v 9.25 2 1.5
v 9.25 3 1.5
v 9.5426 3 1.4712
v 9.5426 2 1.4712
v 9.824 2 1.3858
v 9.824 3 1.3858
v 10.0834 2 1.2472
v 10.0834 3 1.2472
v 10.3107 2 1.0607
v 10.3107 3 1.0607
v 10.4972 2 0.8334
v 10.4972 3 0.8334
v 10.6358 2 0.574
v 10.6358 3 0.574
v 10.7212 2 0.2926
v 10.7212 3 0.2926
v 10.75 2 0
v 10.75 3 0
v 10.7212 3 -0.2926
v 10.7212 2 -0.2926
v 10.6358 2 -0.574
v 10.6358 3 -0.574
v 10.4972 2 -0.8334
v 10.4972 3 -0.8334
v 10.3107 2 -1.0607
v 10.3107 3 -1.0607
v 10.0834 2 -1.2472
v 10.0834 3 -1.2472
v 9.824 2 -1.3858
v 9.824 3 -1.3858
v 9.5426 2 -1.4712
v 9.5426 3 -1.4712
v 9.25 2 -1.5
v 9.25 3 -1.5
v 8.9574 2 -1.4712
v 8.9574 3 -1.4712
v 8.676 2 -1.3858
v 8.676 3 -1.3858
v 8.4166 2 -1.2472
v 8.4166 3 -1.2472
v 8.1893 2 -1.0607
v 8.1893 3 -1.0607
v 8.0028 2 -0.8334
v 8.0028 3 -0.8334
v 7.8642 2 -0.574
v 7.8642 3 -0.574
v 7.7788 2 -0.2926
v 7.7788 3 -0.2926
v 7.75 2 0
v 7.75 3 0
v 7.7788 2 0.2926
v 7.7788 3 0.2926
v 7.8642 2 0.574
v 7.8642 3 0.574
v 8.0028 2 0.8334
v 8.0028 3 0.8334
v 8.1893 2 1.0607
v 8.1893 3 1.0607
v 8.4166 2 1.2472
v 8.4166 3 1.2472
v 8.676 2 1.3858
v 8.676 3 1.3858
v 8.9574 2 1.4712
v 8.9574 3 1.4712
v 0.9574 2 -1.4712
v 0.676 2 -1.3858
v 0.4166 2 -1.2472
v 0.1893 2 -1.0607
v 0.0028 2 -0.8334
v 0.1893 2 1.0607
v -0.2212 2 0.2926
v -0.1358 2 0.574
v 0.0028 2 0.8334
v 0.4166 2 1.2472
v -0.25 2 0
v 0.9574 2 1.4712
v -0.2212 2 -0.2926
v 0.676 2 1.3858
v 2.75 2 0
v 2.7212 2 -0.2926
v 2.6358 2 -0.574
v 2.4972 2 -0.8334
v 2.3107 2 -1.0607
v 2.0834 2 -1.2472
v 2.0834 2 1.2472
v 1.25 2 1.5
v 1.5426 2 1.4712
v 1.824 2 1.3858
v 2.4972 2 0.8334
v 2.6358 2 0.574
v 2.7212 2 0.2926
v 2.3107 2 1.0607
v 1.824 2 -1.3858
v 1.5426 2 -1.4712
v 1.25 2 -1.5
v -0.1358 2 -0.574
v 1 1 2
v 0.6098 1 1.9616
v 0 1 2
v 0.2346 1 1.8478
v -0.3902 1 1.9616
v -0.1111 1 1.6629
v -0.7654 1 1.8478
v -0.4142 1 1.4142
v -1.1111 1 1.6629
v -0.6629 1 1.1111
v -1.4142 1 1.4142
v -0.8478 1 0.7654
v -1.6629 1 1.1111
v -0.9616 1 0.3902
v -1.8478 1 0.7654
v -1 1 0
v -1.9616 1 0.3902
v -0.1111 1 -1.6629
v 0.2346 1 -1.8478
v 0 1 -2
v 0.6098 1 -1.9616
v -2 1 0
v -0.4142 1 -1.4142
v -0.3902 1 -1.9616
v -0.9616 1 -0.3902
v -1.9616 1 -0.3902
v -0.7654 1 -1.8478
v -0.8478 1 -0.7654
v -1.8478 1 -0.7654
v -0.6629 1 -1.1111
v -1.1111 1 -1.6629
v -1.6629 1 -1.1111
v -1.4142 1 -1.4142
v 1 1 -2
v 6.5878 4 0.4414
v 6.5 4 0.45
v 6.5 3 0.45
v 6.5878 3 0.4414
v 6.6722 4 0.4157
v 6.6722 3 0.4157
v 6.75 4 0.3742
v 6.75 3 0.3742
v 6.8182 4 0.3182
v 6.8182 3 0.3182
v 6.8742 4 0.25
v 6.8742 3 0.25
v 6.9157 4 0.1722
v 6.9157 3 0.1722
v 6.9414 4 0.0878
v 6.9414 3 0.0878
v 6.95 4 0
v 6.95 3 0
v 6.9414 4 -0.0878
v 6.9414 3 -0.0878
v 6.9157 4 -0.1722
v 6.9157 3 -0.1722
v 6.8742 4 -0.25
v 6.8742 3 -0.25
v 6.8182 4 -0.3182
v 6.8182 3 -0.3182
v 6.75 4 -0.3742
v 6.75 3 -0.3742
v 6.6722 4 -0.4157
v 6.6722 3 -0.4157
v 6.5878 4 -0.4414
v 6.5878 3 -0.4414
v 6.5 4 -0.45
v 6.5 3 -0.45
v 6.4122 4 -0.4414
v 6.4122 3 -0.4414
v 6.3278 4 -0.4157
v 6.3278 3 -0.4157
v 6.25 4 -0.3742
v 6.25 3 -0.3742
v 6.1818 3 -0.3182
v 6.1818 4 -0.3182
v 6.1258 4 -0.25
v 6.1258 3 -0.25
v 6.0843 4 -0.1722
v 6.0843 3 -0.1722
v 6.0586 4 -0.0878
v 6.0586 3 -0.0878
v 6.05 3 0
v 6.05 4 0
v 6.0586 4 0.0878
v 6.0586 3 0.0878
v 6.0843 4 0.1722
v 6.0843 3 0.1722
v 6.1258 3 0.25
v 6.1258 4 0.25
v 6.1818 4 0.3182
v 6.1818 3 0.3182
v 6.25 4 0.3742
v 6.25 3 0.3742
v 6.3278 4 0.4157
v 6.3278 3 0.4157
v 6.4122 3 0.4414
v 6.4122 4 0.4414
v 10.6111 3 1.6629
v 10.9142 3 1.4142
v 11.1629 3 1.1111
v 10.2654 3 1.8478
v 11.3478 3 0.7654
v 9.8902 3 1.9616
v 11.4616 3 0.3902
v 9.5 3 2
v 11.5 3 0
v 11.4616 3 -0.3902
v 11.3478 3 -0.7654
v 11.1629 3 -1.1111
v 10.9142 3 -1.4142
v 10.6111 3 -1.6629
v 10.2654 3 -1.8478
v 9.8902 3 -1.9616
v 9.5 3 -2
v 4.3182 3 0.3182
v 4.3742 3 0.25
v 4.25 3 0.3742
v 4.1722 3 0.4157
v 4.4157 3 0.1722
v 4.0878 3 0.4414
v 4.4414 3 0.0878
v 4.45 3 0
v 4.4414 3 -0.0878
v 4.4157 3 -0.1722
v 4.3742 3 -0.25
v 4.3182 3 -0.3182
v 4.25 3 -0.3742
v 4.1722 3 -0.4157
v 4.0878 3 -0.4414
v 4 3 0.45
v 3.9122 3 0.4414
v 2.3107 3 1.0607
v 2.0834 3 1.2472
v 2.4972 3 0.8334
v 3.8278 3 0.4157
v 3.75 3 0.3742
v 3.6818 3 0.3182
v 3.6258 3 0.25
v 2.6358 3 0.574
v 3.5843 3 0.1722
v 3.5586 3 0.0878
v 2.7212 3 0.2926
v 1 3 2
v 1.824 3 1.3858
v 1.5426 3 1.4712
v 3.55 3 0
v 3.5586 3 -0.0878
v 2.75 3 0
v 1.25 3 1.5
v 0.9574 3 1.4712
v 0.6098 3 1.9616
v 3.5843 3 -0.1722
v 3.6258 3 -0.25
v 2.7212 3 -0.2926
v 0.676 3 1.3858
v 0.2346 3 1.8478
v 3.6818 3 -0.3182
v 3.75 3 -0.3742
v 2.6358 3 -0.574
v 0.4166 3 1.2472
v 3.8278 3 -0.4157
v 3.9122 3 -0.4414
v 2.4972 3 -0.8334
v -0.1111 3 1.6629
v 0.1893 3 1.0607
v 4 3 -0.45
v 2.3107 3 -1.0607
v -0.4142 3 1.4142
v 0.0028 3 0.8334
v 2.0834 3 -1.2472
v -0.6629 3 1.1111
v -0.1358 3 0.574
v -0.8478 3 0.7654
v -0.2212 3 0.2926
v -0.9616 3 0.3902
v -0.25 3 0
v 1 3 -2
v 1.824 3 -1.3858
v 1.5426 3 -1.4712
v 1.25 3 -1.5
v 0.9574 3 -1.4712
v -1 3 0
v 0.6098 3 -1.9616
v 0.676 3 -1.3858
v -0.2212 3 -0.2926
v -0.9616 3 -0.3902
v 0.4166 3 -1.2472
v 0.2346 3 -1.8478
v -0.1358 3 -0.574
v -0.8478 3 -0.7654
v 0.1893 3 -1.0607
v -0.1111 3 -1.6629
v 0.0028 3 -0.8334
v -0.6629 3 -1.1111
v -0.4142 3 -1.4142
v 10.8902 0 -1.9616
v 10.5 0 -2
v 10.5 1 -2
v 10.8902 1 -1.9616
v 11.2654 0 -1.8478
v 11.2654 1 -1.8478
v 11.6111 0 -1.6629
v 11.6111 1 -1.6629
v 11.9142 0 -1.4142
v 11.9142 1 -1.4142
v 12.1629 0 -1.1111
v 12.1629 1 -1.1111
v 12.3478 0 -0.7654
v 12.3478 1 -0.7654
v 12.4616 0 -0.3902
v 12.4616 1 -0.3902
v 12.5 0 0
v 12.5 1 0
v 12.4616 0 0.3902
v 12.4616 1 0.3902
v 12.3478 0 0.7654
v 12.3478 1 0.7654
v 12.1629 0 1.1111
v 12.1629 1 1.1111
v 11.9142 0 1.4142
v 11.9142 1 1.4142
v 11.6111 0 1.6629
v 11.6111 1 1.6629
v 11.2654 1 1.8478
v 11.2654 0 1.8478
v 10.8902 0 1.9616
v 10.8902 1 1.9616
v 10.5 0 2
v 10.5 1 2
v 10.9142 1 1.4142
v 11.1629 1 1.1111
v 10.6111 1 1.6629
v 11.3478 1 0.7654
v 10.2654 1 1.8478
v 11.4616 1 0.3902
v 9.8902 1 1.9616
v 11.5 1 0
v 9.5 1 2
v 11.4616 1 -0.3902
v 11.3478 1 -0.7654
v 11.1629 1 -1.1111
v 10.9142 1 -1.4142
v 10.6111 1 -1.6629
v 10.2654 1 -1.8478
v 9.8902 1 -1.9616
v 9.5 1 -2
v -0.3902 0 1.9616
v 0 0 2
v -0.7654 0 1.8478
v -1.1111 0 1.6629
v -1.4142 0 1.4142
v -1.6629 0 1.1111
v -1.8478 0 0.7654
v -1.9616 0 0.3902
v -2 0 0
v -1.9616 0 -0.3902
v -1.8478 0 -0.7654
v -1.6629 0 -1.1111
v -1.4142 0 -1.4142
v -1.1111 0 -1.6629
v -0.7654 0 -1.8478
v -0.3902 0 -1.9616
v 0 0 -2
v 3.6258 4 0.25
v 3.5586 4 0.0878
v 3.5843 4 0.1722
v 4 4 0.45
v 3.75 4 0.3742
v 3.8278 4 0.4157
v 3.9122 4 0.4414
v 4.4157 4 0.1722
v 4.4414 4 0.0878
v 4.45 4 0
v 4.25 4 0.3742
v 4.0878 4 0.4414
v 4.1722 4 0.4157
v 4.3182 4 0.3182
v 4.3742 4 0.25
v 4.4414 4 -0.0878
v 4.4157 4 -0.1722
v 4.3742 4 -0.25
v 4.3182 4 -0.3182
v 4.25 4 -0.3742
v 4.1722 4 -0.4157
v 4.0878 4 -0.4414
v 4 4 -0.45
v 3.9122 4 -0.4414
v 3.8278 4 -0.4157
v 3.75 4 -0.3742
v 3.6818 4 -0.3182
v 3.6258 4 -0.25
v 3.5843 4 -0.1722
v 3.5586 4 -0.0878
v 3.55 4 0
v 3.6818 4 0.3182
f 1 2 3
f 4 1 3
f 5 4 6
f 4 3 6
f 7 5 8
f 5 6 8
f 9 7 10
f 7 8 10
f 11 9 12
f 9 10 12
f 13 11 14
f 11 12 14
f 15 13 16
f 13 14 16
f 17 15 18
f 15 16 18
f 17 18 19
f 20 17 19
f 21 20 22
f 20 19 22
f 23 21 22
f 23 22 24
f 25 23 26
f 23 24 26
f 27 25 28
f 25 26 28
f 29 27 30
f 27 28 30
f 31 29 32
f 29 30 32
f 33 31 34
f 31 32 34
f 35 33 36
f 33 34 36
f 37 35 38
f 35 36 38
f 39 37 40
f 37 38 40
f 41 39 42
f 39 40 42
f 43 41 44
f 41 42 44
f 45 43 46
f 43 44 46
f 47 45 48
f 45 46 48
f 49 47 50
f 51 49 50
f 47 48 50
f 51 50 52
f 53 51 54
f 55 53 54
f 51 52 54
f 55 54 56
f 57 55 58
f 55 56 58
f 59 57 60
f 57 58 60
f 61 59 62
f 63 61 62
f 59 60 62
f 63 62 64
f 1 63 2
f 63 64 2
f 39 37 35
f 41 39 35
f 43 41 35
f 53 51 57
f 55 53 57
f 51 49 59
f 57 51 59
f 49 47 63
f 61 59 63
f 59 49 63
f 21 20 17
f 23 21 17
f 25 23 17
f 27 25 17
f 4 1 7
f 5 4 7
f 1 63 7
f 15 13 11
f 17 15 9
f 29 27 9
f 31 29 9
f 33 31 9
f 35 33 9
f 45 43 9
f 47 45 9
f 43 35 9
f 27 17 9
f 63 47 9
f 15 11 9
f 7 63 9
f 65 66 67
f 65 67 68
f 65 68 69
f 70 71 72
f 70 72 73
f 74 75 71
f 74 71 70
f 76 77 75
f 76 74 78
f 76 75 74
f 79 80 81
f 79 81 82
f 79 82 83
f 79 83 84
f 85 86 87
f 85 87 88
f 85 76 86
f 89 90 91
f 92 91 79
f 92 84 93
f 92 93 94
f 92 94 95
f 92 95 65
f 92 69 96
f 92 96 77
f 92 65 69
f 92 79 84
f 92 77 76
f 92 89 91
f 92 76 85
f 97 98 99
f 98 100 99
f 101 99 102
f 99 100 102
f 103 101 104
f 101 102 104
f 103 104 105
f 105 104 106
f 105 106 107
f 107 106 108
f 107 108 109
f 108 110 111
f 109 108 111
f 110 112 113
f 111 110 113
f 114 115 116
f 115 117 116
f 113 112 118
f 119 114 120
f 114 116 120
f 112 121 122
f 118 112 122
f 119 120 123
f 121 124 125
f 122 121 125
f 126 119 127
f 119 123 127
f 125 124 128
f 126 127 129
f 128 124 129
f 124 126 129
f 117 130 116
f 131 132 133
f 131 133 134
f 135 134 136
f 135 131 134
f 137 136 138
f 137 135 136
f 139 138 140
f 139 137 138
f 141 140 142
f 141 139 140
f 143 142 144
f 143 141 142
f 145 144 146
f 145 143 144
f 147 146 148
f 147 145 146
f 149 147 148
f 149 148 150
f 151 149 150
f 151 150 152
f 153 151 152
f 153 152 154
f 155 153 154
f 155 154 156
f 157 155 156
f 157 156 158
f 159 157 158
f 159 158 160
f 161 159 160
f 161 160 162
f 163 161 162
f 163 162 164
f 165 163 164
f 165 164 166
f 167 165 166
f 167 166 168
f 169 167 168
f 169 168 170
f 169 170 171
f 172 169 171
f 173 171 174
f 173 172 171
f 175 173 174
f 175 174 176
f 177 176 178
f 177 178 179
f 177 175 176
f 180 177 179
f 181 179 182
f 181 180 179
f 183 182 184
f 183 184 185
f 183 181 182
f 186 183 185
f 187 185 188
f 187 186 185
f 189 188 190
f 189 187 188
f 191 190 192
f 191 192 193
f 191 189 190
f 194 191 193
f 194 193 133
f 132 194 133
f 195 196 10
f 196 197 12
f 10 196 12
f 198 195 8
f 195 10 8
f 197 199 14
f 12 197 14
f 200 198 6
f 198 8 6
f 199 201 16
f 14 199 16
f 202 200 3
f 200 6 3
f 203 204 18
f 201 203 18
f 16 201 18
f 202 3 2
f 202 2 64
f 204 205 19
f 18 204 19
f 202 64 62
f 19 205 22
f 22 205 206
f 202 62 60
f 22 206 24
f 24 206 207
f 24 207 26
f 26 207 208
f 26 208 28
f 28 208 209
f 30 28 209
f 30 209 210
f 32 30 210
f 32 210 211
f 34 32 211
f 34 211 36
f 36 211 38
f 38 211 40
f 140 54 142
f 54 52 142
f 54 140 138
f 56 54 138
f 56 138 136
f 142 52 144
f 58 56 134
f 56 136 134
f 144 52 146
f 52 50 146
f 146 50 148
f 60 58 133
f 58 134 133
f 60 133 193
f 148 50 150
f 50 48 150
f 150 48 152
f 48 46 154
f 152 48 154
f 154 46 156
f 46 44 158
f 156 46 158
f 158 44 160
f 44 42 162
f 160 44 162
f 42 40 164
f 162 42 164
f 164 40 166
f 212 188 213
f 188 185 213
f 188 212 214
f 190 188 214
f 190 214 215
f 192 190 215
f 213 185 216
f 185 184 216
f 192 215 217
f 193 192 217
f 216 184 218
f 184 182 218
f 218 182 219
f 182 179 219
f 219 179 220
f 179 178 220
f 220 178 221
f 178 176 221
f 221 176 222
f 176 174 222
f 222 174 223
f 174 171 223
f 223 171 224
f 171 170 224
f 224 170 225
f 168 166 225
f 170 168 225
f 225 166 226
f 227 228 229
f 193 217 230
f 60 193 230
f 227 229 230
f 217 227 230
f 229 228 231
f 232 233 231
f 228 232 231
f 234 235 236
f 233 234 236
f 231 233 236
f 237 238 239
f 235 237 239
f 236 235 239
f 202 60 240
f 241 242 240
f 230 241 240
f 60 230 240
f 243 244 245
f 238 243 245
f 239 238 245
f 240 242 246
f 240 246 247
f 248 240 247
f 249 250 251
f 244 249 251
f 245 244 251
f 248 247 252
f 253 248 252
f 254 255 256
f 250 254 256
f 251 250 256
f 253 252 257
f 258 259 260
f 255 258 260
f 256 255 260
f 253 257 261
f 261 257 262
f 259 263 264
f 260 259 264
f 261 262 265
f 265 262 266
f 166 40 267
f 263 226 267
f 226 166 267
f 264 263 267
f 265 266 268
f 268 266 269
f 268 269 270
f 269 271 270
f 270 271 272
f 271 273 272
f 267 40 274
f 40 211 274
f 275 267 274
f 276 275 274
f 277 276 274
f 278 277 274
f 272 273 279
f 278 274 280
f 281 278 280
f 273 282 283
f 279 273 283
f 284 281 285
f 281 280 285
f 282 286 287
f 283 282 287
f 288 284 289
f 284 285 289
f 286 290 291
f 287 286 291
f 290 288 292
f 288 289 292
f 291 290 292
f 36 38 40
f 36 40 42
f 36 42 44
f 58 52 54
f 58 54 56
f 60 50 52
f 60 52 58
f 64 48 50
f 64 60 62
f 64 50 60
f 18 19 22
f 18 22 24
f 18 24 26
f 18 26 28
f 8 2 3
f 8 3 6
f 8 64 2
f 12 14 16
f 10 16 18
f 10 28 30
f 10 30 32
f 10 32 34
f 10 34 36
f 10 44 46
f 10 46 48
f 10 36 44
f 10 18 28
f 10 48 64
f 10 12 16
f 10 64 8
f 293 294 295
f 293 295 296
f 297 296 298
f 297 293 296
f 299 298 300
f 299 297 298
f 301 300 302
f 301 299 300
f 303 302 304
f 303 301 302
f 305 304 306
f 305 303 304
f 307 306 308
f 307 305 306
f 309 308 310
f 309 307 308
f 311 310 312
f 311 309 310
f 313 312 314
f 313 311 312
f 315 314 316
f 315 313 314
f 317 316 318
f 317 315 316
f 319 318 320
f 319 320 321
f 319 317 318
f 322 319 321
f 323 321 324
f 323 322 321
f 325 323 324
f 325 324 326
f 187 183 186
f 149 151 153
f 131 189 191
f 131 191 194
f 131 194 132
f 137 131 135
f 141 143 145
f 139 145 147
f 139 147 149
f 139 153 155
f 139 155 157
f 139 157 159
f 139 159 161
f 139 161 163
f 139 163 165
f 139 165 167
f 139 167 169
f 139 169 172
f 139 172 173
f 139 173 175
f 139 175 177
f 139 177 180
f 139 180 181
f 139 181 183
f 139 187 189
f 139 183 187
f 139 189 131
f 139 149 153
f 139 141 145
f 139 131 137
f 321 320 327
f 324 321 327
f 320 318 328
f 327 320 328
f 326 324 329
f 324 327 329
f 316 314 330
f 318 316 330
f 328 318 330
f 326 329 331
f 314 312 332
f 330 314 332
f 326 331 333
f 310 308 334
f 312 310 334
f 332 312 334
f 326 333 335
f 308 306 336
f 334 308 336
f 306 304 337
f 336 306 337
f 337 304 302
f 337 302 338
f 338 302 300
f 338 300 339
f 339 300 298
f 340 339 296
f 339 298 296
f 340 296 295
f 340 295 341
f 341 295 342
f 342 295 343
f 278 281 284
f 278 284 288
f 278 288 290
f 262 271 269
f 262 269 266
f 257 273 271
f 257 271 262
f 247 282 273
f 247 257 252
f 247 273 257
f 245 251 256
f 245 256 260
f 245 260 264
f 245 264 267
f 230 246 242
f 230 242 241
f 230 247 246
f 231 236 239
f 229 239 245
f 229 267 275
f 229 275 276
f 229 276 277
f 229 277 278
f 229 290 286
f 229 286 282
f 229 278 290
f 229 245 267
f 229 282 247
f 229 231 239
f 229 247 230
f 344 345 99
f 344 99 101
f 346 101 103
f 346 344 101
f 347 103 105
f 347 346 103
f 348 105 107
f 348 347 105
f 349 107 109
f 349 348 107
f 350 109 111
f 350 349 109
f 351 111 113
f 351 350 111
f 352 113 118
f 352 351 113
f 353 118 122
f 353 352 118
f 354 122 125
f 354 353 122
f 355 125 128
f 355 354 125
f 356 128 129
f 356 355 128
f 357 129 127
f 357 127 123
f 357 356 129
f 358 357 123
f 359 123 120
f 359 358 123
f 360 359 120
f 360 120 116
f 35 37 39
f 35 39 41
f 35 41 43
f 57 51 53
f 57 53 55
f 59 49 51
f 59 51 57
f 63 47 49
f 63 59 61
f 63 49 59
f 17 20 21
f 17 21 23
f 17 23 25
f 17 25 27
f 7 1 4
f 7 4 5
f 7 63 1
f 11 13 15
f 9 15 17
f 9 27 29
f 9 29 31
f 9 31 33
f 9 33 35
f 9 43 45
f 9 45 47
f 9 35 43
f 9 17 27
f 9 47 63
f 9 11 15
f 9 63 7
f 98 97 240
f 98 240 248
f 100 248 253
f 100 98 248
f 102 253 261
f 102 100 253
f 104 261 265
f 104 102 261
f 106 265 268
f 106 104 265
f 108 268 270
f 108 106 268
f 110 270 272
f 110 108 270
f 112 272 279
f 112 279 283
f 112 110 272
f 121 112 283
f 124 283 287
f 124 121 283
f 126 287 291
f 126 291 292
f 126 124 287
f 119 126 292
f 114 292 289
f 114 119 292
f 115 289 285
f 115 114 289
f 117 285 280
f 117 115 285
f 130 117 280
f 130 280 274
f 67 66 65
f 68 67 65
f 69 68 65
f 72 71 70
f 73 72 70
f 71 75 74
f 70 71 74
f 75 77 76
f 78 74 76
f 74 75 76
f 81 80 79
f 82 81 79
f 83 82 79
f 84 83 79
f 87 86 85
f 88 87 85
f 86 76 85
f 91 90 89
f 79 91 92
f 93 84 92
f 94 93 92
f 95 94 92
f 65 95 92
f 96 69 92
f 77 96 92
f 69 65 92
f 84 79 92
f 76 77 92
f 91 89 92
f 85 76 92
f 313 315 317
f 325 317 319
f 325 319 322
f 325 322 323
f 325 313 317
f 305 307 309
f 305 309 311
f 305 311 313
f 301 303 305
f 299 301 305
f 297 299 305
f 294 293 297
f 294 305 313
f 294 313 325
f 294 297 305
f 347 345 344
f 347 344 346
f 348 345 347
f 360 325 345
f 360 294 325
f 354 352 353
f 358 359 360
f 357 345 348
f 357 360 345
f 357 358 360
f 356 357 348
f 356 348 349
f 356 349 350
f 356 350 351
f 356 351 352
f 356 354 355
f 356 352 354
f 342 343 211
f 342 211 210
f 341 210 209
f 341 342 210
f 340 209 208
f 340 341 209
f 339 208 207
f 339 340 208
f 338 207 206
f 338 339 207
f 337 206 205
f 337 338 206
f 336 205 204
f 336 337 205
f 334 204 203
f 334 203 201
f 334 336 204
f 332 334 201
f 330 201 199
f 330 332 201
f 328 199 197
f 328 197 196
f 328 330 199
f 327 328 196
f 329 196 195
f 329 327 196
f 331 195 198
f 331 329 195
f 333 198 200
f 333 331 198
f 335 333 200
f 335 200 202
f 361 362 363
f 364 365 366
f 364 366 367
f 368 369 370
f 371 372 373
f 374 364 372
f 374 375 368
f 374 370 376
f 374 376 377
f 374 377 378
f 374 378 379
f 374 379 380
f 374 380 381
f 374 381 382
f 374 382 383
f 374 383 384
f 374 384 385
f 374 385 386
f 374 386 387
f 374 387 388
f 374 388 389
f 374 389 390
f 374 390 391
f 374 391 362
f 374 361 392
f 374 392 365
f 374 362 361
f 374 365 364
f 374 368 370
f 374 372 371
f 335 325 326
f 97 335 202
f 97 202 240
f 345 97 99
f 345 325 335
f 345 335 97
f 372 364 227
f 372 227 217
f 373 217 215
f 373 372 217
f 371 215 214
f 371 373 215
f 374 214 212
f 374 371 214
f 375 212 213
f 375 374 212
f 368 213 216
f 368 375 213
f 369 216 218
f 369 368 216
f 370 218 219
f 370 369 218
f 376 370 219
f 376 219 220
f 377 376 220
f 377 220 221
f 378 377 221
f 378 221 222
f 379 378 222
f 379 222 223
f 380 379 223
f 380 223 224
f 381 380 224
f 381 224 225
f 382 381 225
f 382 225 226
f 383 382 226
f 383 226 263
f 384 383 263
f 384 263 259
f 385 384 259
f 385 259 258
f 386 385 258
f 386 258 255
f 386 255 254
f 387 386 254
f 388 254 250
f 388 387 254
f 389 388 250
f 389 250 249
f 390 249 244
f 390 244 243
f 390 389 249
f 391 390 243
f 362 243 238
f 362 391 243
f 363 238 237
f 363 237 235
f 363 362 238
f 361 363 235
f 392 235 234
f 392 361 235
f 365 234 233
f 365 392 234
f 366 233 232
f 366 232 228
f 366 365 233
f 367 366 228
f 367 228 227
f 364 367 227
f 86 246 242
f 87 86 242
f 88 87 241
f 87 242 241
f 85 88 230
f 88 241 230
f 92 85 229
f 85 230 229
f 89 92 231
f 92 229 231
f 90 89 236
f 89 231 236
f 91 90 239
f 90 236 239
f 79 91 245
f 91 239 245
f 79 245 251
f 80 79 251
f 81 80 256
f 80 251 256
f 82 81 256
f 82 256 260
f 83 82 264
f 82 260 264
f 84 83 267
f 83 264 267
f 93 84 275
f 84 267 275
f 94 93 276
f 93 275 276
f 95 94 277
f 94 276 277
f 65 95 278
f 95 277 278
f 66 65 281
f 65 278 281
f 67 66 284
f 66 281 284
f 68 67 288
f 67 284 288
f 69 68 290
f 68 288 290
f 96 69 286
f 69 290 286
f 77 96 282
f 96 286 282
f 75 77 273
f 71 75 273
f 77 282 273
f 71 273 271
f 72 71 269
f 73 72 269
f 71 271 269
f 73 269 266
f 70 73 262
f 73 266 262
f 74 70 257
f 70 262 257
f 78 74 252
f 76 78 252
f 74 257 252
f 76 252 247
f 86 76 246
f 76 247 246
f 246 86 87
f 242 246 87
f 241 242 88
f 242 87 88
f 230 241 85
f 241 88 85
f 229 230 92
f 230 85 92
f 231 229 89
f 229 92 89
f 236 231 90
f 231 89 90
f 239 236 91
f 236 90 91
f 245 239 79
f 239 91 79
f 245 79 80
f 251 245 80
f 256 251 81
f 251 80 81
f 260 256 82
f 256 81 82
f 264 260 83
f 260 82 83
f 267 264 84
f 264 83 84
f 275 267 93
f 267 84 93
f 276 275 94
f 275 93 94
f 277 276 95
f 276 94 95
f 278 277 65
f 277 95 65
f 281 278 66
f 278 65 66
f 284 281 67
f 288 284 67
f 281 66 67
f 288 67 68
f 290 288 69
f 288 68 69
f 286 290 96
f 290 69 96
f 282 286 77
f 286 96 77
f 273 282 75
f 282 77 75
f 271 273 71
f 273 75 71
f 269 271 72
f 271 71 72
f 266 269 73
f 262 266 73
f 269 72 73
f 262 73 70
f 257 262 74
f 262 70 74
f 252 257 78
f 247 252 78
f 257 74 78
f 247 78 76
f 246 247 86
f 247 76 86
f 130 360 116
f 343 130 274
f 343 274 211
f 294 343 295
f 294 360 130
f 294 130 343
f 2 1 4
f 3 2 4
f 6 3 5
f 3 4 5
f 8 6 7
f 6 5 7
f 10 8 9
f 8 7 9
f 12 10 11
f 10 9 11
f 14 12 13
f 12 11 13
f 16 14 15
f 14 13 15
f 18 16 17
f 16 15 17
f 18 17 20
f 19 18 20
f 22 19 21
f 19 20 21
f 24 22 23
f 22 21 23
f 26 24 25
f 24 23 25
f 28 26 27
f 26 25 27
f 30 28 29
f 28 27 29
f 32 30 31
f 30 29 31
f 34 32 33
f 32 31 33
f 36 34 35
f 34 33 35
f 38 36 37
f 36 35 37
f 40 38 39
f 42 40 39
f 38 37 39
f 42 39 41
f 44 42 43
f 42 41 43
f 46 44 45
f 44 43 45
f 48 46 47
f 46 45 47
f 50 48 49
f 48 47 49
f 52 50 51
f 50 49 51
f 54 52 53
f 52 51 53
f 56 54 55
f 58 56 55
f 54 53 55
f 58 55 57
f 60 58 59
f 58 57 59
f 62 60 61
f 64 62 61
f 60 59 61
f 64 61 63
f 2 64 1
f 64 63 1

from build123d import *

# Parameters (mm, degrees)
BOSS_EXTRUDE2_DEPTH   = 1
BOSS_EXTRUDE3_DEPTH   = 2
SKETCH7_R             = 1.5
SKETCH7_R_2           = 0.45
CUT_EXTRUDE1_DEPTH    = 1
SKETCH8_R             = 1.5
BOSS_EXTRUDE4_DEPTH   = 1
BOSS_EXTRUDE4_2_DEPTH = 1
BOSS_EXTRUDE12_START  = 2
SKETCH9_R             = 0.45
BOSS_EXTRUDE12_DEPTH  = 2


with BuildPart() as part:
    # Sketch4 → Boss-Extrude2 (new body)
    with BuildSketch(Plane(origin=(0, 0, 0), x_dir=(1, 0, 0), z_dir=(0, 1, 0))):
        with BuildLine():
            Line((0, 2), (10.5, 2))
            ThreePointArc((10.5, 2), (12.5, 0), (10.5, -2))
            Line((10.5, -2), (0, -2))
            ThreePointArc((0, -2), (-2, 0), (0, 2))
        make_face()
    extrude(amount=BOSS_EXTRUDE2_DEPTH)

    # Sketch5 → Boss-Extrude3 (add)
    with BuildSketch(Plane(origin=(0, 1, 0), x_dir=(1, 0, 0), z_dir=(0, 1, 0))):
        with BuildLine():
            Line((1, 2), (9.5, 2))
            ThreePointArc((9.5, 2), (11.5, 0), (9.5, -2))
            Line((9.5, -2), (1, -2))
            ThreePointArc((1, -2), (-1, 0), (1, 2))
        make_face()
    extrude(amount=BOSS_EXTRUDE3_DEPTH)

    # Sketch7 → Cut-Extrude1 (cut)
    with BuildSketch(Plane(origin=(0, 3, 0), x_dir=(1, 0, 0), z_dir=(0, 1, 0))):
        with Locations(Location((1.25, 0, 0), (0, 0, 270))):
            Circle(SKETCH7_R)
        with Locations(Location((9.25, 0, 0), (0, 0, 270))):
            Circle(SKETCH7_R)
        with Locations(Location((4, 0, 0), (0, 0, 270))):
            Circle(SKETCH7_R_2)
        with Locations(Location((6.5, 0, 0), (0, 0, 270))):
            Circle(SKETCH7_R_2)
    extrude(amount=-CUT_EXTRUDE1_DEPTH, mode=Mode.SUBTRACT)

    # Sketch9 → Boss-Extrude12 (add)
    with BuildSketch(Plane(origin=(0, 2, 0), x_dir=(1, 0, 0), z_dir=(0, 1, 0)).offset(BOSS_EXTRUDE12_START)):
        with Locations(Location((4, 0, 0), (0, 0, 270))):
            Circle(SKETCH9_R)
        with Locations(Location((6.5, 0, 0), (0, 0, 270))):
            Circle(SKETCH9_R)
    extrude(amount=-BOSS_EXTRUDE12_DEPTH)


with BuildPart() as body_2:
    # Sketch8 → Boss-Extrude4 (new body)
    with BuildSketch(Plane(origin=(0, 2, 0), x_dir=(1, 0, 0), z_dir=(0, 1, 0))):
        with Locations(Location((1.25, 0, 0), (0, 0, 270))):
            Circle(SKETCH8_R)
    extrude(amount=BOSS_EXTRUDE4_DEPTH)


with BuildPart() as body_3:
    # Sketch8 → Boss-Extrude4 2 (new body)
    with BuildSketch(Plane(origin=(0, 2, 0), x_dir=(1, 0, 0), z_dir=(0, 1, 0))):
        with Locations(Location((9.25, 0, 0), (0, 0, 270))):
            Circle(SKETCH8_R)
    extrude(amount=BOSS_EXTRUDE4_2_DEPTH)


solid = Compound([part.part, body_2.part, body_3.part])
